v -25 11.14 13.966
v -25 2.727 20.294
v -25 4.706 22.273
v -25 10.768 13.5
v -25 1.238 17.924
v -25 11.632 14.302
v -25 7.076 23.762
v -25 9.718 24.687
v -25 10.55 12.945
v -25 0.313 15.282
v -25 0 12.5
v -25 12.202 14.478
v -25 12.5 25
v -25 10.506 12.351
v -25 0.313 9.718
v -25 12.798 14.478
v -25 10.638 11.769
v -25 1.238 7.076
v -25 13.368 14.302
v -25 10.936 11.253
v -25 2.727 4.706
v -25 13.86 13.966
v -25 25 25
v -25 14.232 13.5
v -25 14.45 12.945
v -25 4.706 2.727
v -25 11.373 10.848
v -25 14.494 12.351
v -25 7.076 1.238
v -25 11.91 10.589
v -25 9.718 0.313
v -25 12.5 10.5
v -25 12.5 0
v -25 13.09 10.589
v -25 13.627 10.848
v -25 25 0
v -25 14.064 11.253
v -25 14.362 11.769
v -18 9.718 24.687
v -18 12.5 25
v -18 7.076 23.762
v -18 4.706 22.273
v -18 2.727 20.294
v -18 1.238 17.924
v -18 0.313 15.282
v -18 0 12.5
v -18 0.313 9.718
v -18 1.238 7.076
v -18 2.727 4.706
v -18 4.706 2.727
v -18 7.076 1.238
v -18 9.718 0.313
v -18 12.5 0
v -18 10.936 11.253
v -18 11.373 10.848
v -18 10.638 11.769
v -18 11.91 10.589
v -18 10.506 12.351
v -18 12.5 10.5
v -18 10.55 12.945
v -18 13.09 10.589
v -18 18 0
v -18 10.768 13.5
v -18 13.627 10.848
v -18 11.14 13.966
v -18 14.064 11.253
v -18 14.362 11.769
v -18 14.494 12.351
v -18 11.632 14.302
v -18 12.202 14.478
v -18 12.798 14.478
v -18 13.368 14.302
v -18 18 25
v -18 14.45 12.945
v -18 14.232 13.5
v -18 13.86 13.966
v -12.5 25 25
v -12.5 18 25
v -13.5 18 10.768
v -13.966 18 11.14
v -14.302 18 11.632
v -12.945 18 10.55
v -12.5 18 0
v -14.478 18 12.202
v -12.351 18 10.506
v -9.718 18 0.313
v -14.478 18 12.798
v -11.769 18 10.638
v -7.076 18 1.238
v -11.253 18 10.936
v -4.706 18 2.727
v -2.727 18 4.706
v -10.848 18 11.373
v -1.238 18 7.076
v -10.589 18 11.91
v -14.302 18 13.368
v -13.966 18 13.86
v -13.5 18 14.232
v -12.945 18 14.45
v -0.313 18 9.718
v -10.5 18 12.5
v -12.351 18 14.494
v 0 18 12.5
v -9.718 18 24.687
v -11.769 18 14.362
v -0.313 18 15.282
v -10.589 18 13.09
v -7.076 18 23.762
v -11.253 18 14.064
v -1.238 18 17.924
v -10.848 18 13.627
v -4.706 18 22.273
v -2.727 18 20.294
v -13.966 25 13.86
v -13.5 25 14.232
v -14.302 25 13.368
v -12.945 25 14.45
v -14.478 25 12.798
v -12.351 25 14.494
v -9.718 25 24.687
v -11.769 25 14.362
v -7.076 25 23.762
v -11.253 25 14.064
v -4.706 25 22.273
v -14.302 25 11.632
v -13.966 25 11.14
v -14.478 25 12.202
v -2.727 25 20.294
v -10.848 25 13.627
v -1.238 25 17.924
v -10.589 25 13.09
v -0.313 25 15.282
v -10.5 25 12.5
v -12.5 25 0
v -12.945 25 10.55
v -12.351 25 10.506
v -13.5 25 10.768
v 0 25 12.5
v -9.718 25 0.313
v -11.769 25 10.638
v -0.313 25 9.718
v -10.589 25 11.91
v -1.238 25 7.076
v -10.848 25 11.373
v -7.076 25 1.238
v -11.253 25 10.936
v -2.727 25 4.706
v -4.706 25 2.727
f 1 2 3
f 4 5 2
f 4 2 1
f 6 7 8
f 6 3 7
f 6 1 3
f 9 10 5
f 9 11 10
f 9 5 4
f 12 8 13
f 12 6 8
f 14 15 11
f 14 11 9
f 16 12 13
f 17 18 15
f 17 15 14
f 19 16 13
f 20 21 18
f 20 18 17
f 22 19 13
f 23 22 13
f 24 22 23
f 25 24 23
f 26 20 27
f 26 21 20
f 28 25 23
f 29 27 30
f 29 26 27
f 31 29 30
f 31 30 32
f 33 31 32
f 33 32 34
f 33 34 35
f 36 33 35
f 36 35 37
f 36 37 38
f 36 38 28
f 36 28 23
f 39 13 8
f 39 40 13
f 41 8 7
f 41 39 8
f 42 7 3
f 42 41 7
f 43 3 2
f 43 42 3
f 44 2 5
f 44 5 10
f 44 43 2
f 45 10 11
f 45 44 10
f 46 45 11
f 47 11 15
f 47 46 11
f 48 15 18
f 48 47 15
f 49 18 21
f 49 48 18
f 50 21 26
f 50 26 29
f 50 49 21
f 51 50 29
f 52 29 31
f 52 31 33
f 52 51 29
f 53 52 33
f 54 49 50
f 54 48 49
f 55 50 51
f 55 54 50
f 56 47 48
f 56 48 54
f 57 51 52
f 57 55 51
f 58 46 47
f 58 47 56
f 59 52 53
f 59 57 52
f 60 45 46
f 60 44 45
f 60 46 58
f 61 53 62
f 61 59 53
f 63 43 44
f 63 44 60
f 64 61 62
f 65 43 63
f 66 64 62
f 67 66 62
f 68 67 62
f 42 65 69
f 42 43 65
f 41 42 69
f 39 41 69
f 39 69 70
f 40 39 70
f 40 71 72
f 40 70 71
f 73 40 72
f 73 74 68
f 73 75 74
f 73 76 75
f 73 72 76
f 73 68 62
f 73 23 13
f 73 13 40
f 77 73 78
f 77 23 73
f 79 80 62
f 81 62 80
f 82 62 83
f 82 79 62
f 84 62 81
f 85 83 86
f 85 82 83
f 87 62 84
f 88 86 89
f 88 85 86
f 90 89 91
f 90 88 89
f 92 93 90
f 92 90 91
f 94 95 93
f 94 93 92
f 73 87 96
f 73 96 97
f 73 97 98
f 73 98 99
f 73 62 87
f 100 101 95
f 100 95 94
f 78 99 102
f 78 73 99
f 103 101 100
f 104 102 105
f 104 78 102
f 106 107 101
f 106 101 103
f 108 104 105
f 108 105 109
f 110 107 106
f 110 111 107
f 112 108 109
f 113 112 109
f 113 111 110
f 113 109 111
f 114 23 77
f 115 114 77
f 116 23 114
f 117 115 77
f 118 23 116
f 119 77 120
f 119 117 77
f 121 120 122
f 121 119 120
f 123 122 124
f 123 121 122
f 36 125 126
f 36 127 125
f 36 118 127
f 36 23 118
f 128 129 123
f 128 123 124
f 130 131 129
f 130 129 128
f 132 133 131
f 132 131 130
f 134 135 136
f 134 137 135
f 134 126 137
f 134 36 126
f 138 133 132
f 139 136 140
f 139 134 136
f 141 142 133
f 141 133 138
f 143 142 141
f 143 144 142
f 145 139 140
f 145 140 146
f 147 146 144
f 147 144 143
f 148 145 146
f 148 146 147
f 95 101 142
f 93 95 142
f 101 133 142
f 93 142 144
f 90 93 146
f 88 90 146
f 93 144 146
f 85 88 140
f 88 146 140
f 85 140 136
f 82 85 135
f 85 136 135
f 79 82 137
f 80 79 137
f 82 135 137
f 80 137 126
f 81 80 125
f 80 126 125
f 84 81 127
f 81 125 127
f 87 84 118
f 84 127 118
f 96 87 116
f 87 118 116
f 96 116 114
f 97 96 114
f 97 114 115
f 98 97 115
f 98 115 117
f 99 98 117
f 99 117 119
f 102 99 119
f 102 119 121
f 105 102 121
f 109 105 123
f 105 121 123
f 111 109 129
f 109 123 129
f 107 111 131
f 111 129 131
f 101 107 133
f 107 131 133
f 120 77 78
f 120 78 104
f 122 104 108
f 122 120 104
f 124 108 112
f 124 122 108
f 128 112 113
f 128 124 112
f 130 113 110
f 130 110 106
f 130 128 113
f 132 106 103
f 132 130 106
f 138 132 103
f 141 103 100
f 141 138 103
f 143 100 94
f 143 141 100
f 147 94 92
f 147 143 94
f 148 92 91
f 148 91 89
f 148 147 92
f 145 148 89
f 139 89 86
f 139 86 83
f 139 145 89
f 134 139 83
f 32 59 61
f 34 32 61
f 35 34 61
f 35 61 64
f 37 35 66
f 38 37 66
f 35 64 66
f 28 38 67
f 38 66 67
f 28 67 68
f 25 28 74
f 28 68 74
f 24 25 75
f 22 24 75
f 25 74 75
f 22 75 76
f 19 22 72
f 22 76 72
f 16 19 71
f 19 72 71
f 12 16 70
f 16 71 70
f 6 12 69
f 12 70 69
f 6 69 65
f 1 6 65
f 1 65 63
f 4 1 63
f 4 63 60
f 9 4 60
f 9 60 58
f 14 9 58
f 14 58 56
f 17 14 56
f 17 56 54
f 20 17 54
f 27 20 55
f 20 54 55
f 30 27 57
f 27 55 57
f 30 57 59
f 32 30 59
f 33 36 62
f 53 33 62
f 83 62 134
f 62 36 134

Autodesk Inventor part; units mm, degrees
ref_plane "YZ Plane" through (0, 0, 0) normal (1, 0, 0) x (0, 1, 0)
ref_plane "XZ Plane" through (0, 0, 0) normal (0, 1, 0) x (-1, 0, 0)
ref_plane "XY Plane" through (0, 0, 0) normal (0, 0, 1) x (1, 0, 0)
sketch "Sketch1" plane through (0, 0, 0) normal (0, 0, 1) x (1, 0, 0)
  line L0 (0, 0) -> (-25, 0)
  line L1 (-25, 0) -> (-25, 25)
  line L2 (-25, 25) -> (0, 25)
  line L3 (0, 25) -> (0, 0)
  dimension "d0" = 25
  dimension "d1" = 25
extrude "Extrusion1" add sketch "Sketch1" along normal blind 25
sketch "Sketch2" plane through (-25, 25, 0) normal (0, 1, 0) x (1, 0, 0)
  circle A0 centre (12.5, -12.5) radius 2
  line L0 (25, 0) -> (25, -25) projected
  line L1 (25, 0) -> (0, 0) projected
  arc A1 (12.5, -25) -> (12.5, 0) centre (12.5, -12.5) ccw
  line L2 (25, -25) -> (0, -25) projected
  point P0 (25, -12.5)
  dimension "d4" = 4
  dimension "d5" = 12.5
  dimension "d6" = 12.5
extrude "Extrusion2" cut sketch "Sketch2" against normal blind 25
sketch "Sketch3" plane through (0, 0, 25) normal (0, 0, 1) x (1, 0, 0)
  line L0 (0, 0) -> (-18, 0)
  line L1 (-18, 0) -> (-18, 18)
  line L2 (-18, 18) -> (0, 18)
  line L3 (0, 18) -> (0, 0)
  dimension "d9" = 18
  dimension "d10" = 18
extrude "Extrusion3" cut sketch "Sketch3" against normal blind 25
sketch "Sketch4" plane through (-18, 0, 25) normal (1, 0, 0) x (0, 0, -1)
  circle A0 centre (12.5, 12.5) radius 2
  line L0 (25, 0) -> (0, 0) projected
  line L1 (25, 18) -> (25, 0) projected
  arc A1 (0, 12.5) -> (25, 12.5) centre (12.5, 12.5) ccw
  line L2 (0, 0) -> (0, 18) projected
  point P0 (12.5, 0)
  dimension "d13" = 4
  dimension "d14" = 12.5
  dimension "d15" = 12.5
extrude "Extrusion4" cut sketch "Sketch4" against normal blind 25
properties part number "Frame Connector"
